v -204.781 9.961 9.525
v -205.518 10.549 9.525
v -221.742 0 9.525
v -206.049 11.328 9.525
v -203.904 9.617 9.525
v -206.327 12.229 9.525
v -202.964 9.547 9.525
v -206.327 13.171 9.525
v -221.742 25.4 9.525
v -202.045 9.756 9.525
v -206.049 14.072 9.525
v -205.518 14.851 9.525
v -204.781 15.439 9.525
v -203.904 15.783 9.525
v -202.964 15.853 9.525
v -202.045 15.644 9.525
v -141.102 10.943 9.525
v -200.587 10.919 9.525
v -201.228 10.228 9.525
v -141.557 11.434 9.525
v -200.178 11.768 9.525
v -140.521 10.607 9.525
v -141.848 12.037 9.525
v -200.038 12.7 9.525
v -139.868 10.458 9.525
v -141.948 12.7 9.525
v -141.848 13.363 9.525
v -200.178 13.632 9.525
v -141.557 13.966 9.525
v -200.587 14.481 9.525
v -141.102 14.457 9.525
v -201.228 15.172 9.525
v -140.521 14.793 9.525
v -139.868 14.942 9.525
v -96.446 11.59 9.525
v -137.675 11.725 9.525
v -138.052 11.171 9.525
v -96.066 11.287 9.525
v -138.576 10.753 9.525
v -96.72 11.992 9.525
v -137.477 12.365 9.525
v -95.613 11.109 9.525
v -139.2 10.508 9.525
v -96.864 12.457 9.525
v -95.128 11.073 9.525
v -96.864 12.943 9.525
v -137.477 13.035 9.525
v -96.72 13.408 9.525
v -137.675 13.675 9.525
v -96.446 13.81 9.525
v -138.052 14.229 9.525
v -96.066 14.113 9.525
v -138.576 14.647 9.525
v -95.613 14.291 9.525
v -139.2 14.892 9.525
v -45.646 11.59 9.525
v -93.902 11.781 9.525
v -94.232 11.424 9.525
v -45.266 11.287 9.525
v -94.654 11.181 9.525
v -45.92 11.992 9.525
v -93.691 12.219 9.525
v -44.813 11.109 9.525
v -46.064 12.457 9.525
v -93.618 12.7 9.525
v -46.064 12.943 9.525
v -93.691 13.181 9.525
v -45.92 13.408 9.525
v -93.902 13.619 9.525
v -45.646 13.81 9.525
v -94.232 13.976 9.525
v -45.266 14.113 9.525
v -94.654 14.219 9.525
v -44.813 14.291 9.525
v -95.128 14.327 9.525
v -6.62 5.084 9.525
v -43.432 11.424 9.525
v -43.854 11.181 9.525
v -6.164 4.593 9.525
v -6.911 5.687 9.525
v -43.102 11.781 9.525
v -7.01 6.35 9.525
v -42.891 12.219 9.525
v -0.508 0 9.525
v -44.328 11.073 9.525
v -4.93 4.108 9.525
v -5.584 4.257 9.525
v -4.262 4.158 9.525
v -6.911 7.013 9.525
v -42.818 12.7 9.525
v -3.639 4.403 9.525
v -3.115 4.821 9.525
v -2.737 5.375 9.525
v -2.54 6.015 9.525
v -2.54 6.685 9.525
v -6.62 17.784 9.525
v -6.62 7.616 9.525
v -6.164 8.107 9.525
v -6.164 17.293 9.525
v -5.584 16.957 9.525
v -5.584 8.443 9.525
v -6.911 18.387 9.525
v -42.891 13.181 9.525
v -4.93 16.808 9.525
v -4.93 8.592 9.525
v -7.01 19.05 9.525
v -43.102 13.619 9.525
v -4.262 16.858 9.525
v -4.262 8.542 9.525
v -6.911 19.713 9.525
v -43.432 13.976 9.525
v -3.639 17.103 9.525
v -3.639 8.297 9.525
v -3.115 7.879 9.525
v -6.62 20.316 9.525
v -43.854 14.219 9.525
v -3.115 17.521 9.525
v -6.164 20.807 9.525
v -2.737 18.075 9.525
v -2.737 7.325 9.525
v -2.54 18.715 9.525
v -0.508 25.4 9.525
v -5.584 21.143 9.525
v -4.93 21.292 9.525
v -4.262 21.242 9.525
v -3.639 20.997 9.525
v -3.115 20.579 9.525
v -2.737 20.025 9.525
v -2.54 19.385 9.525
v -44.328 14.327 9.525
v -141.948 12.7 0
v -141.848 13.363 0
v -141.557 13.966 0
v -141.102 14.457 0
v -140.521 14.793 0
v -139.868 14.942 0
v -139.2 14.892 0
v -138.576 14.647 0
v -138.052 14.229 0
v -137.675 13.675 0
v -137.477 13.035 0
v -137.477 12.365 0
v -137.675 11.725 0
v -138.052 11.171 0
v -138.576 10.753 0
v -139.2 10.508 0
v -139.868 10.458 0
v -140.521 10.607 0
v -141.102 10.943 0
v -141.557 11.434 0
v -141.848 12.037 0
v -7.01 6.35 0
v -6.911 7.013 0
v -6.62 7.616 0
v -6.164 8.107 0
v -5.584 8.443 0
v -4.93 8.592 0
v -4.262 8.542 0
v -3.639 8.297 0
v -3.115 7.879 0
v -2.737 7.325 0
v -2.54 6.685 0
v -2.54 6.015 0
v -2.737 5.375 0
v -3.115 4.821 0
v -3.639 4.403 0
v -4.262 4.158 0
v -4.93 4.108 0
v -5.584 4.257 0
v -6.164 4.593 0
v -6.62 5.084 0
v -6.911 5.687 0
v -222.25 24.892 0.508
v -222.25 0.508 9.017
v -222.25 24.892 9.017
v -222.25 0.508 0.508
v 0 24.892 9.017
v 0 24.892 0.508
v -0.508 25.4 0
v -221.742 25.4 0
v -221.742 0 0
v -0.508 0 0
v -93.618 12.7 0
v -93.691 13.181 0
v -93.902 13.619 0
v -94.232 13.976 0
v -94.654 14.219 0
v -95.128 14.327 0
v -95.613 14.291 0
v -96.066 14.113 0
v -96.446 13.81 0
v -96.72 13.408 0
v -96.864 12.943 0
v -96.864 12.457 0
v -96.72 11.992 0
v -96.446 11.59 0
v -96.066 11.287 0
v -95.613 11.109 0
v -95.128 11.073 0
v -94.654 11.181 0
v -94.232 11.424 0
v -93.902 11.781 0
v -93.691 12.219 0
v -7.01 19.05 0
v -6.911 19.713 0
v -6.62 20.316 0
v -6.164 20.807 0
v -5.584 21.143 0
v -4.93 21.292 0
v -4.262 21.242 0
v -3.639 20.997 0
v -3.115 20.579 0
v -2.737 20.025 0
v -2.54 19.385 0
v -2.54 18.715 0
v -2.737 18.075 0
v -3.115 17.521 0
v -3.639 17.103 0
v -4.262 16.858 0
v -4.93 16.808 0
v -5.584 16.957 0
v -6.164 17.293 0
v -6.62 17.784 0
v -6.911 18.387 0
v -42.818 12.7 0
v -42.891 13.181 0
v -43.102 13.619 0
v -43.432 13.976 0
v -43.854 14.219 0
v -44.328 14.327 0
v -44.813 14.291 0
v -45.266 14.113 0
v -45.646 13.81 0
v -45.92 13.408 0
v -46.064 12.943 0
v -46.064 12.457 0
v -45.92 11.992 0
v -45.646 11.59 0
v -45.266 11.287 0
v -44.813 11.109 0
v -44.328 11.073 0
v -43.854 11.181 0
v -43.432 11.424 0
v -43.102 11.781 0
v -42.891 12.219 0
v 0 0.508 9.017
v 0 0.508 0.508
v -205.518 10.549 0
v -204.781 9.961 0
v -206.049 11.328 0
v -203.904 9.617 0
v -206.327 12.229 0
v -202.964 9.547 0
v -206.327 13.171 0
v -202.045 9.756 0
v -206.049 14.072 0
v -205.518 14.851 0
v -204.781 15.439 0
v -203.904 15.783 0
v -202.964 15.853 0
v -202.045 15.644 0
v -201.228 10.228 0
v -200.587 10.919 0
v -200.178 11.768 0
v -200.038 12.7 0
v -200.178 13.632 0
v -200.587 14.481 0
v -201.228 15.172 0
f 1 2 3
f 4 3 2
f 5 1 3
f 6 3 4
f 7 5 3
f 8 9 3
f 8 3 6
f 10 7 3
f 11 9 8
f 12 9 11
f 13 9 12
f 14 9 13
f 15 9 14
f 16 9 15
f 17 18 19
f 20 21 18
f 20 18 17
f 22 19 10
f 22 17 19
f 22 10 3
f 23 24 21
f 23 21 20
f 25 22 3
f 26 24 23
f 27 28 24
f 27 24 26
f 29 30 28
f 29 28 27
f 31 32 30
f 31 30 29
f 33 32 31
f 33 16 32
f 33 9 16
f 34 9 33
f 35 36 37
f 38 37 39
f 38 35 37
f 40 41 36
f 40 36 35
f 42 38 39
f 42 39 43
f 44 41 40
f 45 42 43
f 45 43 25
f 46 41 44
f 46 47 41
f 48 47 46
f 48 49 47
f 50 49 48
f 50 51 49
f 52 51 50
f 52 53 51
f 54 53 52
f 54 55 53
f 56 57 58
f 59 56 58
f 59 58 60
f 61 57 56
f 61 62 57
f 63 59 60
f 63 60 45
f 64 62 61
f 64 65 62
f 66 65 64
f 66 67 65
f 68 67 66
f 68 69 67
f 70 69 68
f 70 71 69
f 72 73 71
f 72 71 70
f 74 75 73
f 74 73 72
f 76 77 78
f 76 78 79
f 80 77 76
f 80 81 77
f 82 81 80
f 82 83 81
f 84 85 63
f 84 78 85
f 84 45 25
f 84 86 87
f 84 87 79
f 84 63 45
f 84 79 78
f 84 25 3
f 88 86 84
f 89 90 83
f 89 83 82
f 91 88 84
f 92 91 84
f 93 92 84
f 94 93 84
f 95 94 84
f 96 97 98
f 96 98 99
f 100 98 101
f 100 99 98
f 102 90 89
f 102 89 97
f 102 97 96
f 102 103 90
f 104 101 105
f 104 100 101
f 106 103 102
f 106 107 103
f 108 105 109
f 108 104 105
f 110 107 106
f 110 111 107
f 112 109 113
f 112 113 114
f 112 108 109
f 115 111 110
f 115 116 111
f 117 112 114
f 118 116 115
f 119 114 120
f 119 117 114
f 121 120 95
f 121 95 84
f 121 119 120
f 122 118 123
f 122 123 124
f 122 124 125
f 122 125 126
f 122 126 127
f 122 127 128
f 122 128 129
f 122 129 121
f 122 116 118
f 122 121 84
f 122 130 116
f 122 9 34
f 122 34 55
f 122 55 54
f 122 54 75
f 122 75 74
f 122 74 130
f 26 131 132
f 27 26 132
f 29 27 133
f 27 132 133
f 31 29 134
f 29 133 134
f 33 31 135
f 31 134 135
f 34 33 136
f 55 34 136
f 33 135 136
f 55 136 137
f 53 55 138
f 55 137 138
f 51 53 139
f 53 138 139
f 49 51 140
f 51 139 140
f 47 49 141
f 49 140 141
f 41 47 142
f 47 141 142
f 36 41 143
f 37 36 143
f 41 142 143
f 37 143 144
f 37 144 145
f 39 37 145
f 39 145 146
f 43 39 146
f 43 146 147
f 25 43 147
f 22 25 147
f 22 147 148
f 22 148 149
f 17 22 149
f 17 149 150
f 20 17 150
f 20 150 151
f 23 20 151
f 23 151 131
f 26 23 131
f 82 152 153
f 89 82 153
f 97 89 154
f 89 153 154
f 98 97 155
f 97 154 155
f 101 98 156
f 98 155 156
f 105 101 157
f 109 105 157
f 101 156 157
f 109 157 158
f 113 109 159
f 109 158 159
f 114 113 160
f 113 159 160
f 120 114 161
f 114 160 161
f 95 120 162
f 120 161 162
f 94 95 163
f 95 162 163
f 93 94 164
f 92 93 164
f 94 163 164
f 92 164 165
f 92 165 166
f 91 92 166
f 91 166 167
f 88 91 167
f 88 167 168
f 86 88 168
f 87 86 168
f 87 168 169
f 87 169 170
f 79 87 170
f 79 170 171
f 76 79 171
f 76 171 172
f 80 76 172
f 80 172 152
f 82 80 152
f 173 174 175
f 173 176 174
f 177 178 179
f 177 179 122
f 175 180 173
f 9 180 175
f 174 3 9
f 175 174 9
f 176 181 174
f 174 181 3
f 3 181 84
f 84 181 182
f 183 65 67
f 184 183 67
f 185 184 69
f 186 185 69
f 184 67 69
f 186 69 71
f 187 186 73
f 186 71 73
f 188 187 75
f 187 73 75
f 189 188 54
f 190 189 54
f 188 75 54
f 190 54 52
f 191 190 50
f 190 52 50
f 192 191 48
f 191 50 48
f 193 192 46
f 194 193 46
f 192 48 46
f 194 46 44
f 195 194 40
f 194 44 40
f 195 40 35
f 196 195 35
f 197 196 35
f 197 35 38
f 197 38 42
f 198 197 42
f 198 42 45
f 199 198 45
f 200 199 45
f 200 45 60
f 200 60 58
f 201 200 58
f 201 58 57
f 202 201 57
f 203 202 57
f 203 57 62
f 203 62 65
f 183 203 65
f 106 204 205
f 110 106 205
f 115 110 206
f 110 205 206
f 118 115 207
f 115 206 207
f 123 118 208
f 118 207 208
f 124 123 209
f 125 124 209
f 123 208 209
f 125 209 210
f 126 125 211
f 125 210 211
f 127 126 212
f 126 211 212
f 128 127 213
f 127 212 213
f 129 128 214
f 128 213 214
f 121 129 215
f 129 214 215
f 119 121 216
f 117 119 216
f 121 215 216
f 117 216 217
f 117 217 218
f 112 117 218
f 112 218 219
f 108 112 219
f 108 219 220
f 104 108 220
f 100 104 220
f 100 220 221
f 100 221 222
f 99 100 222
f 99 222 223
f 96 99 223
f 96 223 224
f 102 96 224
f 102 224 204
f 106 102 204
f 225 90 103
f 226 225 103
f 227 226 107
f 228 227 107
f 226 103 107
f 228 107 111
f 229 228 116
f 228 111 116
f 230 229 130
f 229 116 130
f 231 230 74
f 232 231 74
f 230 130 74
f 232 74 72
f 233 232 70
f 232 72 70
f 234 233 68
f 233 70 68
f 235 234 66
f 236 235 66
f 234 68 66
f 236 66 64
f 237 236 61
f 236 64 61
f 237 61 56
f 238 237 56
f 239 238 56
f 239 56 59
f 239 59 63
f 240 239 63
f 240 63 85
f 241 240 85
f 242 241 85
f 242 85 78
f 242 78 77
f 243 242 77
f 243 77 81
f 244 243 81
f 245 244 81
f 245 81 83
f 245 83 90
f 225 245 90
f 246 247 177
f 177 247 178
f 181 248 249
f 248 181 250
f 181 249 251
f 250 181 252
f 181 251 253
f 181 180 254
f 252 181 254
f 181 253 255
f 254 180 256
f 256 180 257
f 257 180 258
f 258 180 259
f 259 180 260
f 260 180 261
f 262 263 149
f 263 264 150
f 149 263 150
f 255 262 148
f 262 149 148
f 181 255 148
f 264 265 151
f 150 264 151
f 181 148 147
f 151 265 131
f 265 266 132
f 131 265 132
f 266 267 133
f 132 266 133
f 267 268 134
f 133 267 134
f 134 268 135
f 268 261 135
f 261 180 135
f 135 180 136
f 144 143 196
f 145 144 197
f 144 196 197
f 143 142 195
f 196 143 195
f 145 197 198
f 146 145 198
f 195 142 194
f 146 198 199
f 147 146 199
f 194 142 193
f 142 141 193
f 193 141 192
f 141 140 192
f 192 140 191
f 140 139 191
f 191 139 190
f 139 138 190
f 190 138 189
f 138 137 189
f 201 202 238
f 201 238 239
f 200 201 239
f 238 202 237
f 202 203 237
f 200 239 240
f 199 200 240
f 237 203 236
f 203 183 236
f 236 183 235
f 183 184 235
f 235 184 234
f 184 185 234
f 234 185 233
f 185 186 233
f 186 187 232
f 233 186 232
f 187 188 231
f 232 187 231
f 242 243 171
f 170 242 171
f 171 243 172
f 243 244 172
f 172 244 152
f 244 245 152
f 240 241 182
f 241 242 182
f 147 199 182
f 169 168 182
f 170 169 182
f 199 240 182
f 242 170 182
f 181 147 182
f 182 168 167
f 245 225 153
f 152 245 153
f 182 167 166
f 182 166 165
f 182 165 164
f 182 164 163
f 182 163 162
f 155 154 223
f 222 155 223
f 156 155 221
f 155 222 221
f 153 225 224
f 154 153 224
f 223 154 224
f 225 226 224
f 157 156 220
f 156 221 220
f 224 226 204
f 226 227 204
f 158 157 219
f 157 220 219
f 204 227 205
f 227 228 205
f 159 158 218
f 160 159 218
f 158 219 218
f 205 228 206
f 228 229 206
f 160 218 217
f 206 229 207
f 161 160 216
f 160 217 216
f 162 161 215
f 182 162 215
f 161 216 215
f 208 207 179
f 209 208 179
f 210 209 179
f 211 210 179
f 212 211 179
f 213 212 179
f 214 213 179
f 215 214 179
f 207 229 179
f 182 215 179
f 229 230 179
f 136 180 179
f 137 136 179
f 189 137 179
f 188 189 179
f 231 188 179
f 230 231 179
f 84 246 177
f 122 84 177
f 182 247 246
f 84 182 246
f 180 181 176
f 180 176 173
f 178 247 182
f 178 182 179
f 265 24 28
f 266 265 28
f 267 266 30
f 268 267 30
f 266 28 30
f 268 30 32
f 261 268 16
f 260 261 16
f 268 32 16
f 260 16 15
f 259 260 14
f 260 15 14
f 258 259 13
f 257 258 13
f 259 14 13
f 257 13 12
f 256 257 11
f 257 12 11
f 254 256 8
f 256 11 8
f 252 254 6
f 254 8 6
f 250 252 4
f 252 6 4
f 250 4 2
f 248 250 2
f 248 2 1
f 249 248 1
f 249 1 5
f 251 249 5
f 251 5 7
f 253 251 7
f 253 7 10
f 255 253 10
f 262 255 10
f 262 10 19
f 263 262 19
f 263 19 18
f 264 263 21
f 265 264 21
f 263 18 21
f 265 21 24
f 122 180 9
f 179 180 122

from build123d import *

# Parameters (mm, degrees)
SKETCH1_W                 = 222.25
SKETCH1_H                 = 25.4
BOSS_EXTRUDE1_DEPTH       = 9.525
F_8_CLEARANCE_HOLE1_D     = 4.4958
F_8_CLEARANCE_HOLE1_DEPTH = 25.4
F_8_CLEARANCE_HOLE1_TIP   = 1.350674586
SKETCH5_R                 = 3.1623
CUT_EXTRUDE1_DEPTH        = 9.525
F_8_CLEARANCE_HOLE2_D     = 4.4958
F_8_CLEARANCE_HOLE2_DEPTH = 19.05
F_8_CLEARANCE_HOLE2_TIP   = 1.350674586
CHAMFER1_SIZE             = 0.508
F_4_CLEARANCE_HOLE1_D     = 3.2639


with BuildPart() as part:
    # Sketch1 → Boss-Extrude1 (new body)
    with BuildSketch(Plane.XY):
        with Locations((-111.125, 12.7)):
            Rectangle(SKETCH1_W, SKETCH1_H)
    extrude(amount=BOSS_EXTRUDE1_DEPTH)

    # #8 Clearance Hole1
    with Locations(Plane.XY.offset(9.525)):
        with Locations((-4.7625, 6.35), (-4.7625, 19.05)):
            Hole(F_8_CLEARANCE_HOLE1_D / 2, depth=F_8_CLEARANCE_HOLE1_DEPTH)
            with Locations((0, 0, -(F_8_CLEARANCE_HOLE1_DEPTH + F_8_CLEARANCE_HOLE1_TIP / 2))):  # 118° drill point
                Cone(0, F_8_CLEARANCE_HOLE1_D / 2, F_8_CLEARANCE_HOLE1_TIP, mode=Mode.SUBTRACT)

    # Sketch5 → Cut-Extrude1 (cut)
    with BuildSketch(Plane.XY.offset(9.525)):
        with Locations((-203.2, 12.7)):
            Circle(SKETCH5_R)
    extrude(amount=-CUT_EXTRUDE1_DEPTH, mode=Mode.SUBTRACT)

    # #8 Clearance Hole2
    with Locations(Plane.XY.offset(9.525)):
        with Locations((-139.7, 12.7)):
            Hole(F_8_CLEARANCE_HOLE2_D / 2, depth=F_8_CLEARANCE_HOLE2_DEPTH)
            with Locations((0, 0, -(F_8_CLEARANCE_HOLE2_DEPTH + F_8_CLEARANCE_HOLE2_TIP / 2))):  # 118° drill point
                Cone(0, F_8_CLEARANCE_HOLE2_D / 2, F_8_CLEARANCE_HOLE2_TIP, mode=Mode.SUBTRACT)

    # Chamfer1
    chamfer1_edges = [part.edges().sort_by_distance(p)[0] for p in [
        (-222.25, 12.7, 9.525),
        (0, 12.7, 9.525),
        (-222.25, 12.7, 0),
        (0, 12.7, 0),
        (0, 0, 4.7625),
        (-222.25, 0, 4.7625),
        (-222.25, 25.4, 4.7625),
        (0, 25.4, 4.7625),
    ]]
    chamfer(chamfer1_edges, length=CHAMFER1_SIZE)

    # #4 Clearance Hole1 (through all)
    with Locations(Plane(origin=(0, 0, 0), x_dir=(-1, 0, 0), z_dir=(0, 0, -1))):
        with Locations((95.25, 12.7), (44.45, 12.7)):
            Hole(F_4_CLEARANCE_HOLE1_D / 2)


solid = part.part
